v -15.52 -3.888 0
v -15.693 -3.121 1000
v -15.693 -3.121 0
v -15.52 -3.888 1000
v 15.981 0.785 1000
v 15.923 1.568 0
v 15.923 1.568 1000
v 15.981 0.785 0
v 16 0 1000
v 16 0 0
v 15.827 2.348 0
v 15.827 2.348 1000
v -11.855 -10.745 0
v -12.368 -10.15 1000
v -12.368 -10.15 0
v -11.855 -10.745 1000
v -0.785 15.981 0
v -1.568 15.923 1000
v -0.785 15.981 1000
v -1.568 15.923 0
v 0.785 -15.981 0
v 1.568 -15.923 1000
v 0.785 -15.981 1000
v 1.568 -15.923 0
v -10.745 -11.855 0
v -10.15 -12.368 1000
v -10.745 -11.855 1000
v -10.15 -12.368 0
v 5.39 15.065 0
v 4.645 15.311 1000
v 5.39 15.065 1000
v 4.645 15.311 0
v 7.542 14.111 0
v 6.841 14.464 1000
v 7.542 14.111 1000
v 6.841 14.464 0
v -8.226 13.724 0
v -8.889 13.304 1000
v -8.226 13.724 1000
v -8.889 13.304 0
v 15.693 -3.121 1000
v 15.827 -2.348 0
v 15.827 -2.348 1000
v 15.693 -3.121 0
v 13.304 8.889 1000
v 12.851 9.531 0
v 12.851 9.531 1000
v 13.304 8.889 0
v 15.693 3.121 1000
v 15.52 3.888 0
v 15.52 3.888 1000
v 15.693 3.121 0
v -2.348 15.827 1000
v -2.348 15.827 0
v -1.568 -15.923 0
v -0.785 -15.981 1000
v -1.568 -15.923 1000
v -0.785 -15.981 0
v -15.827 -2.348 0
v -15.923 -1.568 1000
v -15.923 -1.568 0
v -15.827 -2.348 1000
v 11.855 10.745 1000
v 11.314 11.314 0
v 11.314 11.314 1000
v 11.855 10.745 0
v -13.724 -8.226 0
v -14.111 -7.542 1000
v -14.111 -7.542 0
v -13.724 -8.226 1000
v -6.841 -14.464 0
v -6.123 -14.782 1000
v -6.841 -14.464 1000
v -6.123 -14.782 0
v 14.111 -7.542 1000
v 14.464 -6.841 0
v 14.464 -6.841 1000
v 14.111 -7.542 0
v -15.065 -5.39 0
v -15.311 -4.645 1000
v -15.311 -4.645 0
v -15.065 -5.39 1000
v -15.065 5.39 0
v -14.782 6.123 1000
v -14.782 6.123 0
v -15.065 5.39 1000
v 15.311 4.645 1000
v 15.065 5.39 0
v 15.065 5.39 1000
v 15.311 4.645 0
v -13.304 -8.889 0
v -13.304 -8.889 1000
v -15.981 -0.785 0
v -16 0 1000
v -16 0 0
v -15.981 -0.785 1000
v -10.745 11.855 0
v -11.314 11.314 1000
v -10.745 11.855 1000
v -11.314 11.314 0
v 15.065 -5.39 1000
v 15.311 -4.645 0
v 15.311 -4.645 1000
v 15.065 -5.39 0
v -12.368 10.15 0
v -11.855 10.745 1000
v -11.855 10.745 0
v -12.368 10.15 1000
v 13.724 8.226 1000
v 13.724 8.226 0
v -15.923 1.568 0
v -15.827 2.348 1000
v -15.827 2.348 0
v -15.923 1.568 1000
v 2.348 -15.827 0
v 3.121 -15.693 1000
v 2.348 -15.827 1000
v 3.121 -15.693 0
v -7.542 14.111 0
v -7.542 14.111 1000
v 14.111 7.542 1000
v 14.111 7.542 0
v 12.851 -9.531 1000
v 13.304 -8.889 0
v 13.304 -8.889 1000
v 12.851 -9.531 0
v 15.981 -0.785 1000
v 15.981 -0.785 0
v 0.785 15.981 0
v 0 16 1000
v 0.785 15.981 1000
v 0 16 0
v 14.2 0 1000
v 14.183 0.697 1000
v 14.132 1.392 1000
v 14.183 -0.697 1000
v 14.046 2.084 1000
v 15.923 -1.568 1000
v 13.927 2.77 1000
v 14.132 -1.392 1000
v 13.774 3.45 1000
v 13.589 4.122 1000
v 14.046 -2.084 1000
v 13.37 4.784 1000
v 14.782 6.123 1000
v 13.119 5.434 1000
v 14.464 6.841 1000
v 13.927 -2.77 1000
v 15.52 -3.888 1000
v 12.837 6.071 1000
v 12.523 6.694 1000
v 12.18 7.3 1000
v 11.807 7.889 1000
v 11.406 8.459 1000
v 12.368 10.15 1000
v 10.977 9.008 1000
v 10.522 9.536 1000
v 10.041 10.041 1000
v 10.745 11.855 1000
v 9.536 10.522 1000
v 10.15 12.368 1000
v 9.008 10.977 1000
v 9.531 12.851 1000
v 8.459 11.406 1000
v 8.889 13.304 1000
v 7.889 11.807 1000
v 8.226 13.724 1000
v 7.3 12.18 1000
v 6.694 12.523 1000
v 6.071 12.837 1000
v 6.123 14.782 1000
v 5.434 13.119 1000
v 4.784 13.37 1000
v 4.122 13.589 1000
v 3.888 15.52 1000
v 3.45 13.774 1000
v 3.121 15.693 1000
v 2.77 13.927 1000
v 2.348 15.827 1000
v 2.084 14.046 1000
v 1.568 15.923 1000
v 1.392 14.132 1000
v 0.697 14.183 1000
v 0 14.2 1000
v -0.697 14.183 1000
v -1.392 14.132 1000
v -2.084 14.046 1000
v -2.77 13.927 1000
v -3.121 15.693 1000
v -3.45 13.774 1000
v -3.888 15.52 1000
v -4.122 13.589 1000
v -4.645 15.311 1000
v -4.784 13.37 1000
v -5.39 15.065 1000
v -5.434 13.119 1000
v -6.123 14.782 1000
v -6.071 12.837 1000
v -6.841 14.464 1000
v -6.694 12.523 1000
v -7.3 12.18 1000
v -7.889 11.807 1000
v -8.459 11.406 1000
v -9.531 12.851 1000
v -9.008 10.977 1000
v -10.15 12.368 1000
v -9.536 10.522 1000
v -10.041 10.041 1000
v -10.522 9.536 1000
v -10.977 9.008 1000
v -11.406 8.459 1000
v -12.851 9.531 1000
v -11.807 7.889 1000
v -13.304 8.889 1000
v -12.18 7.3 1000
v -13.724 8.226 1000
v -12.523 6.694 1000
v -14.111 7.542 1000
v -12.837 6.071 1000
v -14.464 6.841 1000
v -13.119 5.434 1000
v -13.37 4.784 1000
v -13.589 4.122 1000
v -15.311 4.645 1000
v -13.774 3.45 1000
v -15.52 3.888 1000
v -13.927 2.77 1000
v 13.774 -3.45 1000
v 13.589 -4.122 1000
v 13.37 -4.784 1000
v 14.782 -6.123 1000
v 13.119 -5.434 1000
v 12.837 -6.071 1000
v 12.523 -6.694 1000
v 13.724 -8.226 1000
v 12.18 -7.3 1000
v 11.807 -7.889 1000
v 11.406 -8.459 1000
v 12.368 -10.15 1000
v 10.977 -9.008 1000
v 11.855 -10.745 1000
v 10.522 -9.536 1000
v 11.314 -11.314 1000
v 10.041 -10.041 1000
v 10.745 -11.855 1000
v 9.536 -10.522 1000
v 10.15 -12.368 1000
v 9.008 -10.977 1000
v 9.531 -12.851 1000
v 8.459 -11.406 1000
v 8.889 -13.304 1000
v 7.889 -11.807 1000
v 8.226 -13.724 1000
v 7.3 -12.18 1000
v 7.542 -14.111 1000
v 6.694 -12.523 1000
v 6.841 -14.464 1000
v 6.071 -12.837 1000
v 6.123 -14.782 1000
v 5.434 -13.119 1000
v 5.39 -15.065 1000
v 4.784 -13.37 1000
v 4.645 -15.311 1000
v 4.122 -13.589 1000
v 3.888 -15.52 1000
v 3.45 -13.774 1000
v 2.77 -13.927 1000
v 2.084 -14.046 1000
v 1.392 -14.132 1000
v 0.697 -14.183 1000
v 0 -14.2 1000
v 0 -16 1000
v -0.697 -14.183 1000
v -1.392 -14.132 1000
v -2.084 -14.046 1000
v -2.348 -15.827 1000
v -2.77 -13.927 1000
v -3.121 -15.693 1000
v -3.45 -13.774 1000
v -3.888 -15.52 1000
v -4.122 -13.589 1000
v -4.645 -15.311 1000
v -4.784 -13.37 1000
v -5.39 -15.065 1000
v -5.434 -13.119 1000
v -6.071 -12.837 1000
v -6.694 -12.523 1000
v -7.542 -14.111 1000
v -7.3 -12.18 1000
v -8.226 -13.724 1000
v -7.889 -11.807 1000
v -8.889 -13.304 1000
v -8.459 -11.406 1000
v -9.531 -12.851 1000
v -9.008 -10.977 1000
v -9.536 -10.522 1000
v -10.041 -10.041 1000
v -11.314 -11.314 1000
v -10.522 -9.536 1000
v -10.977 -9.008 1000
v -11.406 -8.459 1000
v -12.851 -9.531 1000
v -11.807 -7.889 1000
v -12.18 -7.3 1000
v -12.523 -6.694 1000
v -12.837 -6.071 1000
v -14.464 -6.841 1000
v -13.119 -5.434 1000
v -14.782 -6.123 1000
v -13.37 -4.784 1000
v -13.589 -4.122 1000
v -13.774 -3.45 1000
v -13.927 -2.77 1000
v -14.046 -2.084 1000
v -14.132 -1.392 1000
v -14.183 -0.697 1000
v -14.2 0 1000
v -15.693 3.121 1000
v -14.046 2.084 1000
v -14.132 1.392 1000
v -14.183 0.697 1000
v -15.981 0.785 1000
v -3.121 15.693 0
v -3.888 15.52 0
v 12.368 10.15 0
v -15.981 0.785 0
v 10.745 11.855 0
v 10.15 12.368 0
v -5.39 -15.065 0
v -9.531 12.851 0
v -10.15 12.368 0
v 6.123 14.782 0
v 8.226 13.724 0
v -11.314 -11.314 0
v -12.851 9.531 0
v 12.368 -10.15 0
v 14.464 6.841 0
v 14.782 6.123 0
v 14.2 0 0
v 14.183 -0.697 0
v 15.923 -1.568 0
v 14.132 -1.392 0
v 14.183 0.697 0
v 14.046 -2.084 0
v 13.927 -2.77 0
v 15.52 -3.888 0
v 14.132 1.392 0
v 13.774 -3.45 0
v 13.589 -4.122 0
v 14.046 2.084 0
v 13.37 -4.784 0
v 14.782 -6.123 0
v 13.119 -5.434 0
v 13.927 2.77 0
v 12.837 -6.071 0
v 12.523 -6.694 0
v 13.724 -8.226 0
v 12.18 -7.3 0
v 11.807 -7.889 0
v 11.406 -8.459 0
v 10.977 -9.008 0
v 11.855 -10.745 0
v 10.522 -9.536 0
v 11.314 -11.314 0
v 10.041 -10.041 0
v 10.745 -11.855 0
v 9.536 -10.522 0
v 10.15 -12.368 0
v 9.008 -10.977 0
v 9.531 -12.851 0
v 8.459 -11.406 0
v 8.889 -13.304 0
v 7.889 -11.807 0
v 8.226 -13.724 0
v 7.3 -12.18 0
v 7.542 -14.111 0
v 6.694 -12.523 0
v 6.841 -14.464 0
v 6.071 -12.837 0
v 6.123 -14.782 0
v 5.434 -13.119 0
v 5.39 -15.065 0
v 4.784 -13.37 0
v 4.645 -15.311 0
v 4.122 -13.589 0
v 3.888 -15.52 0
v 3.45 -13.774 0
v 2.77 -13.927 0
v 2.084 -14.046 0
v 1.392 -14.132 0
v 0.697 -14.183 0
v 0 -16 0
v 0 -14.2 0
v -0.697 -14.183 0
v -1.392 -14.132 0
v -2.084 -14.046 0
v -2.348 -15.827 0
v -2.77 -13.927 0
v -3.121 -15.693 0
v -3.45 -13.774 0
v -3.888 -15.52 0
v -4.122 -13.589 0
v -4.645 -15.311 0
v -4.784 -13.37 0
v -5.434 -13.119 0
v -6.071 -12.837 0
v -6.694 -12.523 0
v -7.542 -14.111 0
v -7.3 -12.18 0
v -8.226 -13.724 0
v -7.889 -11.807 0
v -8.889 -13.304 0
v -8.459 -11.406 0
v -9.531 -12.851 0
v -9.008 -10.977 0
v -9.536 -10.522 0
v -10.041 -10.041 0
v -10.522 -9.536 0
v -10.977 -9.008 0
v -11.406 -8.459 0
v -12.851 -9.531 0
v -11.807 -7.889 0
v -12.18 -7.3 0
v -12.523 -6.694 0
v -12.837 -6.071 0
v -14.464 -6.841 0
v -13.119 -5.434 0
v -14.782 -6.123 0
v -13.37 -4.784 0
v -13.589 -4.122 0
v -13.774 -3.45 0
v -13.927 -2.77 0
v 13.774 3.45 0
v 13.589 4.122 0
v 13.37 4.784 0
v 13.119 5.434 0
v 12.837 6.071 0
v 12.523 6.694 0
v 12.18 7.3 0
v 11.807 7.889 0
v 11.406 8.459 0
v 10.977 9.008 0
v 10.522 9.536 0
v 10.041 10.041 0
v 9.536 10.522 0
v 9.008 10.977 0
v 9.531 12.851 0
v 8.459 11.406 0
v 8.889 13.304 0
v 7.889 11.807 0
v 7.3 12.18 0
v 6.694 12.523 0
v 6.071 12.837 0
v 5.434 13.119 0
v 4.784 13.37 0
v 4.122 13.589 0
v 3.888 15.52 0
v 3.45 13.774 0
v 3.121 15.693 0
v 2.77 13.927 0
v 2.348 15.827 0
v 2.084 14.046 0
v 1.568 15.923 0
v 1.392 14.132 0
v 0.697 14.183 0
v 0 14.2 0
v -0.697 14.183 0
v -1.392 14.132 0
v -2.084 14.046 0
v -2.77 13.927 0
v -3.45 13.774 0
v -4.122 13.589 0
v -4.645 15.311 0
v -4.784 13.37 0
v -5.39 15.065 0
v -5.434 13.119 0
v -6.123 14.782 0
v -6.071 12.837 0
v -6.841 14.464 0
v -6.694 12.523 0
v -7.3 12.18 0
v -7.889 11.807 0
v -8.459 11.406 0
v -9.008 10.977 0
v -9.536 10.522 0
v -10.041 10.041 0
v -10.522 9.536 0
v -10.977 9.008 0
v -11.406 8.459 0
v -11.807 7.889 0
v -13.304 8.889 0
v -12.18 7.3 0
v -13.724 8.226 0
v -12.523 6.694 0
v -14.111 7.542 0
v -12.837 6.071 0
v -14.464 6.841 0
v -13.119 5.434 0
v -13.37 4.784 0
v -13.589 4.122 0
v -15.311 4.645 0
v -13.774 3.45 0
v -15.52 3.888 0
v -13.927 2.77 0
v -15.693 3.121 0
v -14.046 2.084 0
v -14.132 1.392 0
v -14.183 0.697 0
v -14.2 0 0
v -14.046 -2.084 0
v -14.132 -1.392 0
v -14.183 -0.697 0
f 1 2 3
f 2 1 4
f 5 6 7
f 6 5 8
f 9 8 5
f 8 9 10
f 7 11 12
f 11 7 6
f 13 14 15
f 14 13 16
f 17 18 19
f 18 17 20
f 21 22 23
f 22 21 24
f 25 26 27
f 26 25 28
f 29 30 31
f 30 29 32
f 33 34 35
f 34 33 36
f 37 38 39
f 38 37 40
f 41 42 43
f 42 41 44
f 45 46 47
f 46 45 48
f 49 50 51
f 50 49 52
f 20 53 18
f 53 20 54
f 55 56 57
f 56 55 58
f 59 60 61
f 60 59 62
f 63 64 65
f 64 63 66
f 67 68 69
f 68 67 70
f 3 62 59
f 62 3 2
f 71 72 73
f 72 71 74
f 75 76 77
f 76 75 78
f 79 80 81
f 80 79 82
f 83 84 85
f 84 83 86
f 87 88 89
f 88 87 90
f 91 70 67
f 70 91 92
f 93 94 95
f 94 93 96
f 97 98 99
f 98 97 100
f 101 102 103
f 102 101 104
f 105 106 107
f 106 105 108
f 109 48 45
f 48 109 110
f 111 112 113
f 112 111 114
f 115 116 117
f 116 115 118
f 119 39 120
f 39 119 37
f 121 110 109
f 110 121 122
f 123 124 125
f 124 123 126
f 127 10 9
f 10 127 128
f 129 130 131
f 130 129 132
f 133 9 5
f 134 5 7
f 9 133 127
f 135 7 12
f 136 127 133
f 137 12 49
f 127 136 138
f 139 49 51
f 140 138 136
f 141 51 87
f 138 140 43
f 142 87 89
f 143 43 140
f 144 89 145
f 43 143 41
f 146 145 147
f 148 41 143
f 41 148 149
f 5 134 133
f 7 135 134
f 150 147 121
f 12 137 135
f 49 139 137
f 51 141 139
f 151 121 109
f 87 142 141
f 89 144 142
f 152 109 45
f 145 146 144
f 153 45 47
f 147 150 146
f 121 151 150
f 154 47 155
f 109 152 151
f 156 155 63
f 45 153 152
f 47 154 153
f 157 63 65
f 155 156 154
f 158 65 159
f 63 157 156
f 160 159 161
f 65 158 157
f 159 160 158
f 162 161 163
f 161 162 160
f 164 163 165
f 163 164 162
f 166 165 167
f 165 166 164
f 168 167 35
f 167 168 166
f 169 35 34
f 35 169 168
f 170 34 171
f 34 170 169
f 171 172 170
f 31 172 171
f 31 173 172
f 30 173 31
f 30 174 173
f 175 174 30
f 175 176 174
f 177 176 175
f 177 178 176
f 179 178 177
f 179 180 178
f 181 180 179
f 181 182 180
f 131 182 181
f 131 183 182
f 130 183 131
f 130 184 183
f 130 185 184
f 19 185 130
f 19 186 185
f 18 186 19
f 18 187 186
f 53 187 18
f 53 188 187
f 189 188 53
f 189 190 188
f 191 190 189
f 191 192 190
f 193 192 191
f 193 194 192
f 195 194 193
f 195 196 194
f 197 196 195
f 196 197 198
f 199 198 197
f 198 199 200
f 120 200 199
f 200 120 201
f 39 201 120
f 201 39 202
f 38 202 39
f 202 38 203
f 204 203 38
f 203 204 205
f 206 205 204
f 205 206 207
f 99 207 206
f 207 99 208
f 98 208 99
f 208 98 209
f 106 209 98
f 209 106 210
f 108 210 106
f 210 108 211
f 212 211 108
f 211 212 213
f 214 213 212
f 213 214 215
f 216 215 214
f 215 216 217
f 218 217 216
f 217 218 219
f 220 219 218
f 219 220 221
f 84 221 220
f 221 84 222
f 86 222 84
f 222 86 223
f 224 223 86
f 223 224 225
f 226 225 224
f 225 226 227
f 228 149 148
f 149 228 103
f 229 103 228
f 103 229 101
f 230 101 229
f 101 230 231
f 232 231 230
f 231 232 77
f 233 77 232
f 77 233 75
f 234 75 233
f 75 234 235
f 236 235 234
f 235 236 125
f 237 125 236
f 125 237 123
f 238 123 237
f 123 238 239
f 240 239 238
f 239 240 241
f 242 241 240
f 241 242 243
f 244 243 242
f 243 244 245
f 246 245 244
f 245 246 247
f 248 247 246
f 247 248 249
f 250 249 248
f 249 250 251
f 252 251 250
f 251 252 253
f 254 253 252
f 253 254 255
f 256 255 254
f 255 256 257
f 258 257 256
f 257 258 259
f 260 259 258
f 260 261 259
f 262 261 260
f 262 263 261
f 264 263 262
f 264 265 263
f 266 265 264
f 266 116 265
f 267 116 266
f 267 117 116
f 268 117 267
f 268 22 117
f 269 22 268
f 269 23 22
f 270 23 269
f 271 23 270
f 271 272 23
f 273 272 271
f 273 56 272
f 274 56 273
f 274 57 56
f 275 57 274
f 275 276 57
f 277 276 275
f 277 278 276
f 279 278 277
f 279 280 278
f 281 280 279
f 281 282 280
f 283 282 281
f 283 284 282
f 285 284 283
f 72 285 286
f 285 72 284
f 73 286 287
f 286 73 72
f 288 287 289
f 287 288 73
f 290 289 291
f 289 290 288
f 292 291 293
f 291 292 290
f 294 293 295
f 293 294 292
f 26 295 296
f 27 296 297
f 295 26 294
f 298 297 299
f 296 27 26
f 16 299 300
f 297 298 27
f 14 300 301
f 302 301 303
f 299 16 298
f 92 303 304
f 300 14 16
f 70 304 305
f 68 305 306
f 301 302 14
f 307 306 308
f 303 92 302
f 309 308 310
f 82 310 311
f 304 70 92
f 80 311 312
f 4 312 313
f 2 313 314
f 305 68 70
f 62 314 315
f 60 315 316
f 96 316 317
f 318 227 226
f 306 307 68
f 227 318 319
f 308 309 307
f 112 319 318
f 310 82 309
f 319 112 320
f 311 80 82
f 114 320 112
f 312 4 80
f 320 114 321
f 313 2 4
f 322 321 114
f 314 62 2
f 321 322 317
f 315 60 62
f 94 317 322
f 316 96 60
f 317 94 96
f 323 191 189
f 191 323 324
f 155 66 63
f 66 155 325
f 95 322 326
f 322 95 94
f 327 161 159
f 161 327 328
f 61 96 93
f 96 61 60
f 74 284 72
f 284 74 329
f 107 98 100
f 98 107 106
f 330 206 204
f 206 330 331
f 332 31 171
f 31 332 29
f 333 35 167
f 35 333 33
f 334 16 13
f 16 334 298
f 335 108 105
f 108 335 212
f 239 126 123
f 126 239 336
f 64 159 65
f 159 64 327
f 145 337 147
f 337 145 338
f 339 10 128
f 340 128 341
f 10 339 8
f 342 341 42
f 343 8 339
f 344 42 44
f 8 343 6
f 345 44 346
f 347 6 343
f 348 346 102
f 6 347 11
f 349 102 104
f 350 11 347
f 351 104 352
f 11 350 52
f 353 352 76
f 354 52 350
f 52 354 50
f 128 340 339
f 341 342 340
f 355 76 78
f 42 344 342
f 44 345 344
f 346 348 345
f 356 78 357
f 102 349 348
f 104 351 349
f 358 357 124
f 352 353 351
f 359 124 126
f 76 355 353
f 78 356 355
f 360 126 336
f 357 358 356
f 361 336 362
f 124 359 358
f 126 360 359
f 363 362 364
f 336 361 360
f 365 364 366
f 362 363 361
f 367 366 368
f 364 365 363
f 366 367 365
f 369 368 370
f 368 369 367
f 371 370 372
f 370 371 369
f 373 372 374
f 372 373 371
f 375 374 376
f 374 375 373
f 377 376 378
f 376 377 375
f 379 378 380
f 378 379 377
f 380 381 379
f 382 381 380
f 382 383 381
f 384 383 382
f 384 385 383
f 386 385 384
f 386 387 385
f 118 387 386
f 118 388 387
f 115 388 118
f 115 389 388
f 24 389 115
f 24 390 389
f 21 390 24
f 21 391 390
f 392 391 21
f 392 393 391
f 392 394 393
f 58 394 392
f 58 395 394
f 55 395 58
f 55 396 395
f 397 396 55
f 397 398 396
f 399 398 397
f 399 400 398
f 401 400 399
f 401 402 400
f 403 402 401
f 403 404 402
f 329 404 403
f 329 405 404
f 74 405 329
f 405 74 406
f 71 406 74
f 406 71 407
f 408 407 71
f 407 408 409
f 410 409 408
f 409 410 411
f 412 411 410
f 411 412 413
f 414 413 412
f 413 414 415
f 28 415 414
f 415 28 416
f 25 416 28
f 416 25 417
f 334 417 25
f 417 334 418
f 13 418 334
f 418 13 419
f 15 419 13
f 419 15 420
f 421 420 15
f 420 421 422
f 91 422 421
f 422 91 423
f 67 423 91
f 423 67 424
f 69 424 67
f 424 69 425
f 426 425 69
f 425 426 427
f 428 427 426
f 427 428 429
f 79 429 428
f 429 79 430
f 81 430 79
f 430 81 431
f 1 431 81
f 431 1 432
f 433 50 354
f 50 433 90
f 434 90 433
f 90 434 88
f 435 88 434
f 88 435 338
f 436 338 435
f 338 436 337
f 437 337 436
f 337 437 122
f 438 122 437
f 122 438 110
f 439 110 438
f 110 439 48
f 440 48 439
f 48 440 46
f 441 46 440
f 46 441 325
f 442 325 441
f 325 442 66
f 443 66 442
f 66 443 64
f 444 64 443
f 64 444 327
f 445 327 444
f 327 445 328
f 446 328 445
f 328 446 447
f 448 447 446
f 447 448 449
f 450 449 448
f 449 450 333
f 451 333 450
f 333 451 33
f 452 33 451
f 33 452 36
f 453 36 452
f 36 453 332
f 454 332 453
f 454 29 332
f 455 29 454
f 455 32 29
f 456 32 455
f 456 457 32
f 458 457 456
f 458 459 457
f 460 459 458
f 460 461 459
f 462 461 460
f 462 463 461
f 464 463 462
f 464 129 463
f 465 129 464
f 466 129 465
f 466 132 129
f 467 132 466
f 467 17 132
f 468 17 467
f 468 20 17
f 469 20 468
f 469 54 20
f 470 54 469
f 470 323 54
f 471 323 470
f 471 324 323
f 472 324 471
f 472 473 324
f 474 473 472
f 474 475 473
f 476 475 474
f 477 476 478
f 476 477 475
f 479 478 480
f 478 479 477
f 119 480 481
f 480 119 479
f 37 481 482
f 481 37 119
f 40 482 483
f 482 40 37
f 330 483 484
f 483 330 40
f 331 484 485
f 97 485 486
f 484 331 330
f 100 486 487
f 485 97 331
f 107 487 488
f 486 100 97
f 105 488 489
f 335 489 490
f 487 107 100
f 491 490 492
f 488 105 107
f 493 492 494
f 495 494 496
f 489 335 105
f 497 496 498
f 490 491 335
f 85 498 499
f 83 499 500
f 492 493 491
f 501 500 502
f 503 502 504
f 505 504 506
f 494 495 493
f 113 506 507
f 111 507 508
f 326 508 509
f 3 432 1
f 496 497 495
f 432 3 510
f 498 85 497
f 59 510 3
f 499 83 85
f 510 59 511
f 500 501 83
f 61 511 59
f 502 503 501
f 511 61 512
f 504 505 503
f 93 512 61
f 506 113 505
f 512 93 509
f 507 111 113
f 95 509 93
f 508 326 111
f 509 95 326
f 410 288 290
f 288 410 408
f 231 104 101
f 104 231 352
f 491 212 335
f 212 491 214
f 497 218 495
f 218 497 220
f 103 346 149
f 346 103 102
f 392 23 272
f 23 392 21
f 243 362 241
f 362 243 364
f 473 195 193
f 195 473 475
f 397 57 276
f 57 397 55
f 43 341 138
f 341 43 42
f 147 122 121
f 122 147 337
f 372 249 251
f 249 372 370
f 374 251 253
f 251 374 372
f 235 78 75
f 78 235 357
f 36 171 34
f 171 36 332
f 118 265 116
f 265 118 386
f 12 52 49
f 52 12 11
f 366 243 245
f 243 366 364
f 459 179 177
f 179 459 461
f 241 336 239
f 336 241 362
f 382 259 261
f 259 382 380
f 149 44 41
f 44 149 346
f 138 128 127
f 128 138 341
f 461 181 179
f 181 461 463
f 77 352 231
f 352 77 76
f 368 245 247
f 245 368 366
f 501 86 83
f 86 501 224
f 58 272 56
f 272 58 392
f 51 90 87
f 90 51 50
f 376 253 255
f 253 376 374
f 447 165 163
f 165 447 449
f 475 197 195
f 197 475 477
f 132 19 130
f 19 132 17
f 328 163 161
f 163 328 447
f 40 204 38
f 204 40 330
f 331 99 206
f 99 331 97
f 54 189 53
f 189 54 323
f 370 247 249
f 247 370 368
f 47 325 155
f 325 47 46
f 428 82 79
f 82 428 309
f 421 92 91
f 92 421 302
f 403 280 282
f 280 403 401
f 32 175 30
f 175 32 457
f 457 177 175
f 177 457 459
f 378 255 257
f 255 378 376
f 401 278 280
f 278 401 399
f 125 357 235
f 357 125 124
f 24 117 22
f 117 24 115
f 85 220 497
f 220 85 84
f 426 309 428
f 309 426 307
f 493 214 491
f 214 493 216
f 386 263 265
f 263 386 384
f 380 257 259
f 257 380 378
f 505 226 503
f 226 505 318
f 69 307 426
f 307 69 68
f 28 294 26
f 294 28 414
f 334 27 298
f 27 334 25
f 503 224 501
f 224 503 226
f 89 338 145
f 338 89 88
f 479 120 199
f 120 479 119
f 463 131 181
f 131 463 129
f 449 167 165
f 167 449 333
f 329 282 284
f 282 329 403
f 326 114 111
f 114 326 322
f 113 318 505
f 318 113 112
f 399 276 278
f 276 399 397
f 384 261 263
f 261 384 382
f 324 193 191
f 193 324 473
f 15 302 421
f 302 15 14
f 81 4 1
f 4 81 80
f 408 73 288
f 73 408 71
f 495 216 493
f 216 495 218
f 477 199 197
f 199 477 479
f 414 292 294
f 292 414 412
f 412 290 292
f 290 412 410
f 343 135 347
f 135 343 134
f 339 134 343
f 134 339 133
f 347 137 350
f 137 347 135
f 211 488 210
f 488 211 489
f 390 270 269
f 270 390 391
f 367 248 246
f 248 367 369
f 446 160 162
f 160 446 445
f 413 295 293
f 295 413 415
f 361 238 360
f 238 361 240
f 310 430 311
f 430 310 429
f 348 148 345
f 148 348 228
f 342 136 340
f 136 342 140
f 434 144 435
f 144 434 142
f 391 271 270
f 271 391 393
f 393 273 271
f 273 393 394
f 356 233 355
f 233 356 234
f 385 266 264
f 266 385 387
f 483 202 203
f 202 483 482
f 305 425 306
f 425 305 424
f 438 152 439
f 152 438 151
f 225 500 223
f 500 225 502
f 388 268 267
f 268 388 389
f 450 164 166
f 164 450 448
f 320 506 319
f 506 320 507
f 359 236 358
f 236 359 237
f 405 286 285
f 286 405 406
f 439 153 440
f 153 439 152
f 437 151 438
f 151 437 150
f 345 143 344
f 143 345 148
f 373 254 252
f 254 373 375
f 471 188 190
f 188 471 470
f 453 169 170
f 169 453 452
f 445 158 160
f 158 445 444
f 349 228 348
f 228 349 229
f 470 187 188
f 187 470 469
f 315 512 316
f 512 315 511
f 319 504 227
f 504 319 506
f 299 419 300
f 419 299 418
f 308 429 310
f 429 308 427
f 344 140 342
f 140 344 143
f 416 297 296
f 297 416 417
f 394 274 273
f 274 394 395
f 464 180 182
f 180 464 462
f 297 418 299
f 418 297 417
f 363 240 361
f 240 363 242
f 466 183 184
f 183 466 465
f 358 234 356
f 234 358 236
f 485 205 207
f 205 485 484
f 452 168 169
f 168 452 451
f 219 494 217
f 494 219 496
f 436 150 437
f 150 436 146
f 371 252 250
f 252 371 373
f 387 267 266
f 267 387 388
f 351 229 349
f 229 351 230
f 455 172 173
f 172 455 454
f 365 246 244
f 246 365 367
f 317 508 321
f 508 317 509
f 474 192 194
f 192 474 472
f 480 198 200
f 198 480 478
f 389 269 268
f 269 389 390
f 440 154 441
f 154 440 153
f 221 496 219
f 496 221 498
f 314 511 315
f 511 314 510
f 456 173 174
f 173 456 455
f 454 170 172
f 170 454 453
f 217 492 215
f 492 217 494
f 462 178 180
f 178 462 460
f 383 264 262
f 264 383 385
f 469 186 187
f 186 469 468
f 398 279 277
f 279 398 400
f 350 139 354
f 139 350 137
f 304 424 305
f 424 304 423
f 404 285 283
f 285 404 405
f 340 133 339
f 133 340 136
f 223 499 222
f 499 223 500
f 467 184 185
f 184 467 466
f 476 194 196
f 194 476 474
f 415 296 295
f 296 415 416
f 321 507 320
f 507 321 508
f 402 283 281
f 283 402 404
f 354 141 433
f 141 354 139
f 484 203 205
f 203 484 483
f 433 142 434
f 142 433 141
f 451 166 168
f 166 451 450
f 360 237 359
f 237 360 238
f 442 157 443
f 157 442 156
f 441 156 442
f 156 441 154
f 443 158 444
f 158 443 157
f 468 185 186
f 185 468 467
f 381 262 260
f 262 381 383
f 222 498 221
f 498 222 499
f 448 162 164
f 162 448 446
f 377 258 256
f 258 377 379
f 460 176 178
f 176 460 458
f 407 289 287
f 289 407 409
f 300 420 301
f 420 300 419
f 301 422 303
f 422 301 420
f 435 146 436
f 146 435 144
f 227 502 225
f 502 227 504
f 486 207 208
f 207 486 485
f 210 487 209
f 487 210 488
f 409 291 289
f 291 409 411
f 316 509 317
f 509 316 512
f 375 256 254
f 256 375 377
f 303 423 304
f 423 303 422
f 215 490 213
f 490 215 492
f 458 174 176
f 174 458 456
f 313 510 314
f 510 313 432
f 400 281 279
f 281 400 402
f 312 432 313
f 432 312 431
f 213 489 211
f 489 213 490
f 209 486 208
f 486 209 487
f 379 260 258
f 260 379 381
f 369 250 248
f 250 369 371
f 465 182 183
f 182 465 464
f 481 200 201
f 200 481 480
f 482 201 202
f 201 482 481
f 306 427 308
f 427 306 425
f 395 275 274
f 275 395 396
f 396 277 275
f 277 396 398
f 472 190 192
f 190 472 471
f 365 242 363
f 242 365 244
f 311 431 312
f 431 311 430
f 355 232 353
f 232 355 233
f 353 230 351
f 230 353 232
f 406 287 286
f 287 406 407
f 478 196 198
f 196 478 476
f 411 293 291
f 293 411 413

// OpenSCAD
$fn = 128;

// HT 32 pipe, length 1000 mm (approx. DN32)
// Typical HT pipe outer diameter ~ 32 mm; wall thickness ~ 1.8 mm (approx.)
od = 32;
wall = 1.8;
id = od - 2*wall;
len = 1000;

module ht_pipe(od, id, len) {
    difference() {
        cylinder(h = len, d = od);
        translate([0,0,-0.1]) cylinder(h = len + 0.2, d = id);
    }
}

ht_pipe(od, id, len);
